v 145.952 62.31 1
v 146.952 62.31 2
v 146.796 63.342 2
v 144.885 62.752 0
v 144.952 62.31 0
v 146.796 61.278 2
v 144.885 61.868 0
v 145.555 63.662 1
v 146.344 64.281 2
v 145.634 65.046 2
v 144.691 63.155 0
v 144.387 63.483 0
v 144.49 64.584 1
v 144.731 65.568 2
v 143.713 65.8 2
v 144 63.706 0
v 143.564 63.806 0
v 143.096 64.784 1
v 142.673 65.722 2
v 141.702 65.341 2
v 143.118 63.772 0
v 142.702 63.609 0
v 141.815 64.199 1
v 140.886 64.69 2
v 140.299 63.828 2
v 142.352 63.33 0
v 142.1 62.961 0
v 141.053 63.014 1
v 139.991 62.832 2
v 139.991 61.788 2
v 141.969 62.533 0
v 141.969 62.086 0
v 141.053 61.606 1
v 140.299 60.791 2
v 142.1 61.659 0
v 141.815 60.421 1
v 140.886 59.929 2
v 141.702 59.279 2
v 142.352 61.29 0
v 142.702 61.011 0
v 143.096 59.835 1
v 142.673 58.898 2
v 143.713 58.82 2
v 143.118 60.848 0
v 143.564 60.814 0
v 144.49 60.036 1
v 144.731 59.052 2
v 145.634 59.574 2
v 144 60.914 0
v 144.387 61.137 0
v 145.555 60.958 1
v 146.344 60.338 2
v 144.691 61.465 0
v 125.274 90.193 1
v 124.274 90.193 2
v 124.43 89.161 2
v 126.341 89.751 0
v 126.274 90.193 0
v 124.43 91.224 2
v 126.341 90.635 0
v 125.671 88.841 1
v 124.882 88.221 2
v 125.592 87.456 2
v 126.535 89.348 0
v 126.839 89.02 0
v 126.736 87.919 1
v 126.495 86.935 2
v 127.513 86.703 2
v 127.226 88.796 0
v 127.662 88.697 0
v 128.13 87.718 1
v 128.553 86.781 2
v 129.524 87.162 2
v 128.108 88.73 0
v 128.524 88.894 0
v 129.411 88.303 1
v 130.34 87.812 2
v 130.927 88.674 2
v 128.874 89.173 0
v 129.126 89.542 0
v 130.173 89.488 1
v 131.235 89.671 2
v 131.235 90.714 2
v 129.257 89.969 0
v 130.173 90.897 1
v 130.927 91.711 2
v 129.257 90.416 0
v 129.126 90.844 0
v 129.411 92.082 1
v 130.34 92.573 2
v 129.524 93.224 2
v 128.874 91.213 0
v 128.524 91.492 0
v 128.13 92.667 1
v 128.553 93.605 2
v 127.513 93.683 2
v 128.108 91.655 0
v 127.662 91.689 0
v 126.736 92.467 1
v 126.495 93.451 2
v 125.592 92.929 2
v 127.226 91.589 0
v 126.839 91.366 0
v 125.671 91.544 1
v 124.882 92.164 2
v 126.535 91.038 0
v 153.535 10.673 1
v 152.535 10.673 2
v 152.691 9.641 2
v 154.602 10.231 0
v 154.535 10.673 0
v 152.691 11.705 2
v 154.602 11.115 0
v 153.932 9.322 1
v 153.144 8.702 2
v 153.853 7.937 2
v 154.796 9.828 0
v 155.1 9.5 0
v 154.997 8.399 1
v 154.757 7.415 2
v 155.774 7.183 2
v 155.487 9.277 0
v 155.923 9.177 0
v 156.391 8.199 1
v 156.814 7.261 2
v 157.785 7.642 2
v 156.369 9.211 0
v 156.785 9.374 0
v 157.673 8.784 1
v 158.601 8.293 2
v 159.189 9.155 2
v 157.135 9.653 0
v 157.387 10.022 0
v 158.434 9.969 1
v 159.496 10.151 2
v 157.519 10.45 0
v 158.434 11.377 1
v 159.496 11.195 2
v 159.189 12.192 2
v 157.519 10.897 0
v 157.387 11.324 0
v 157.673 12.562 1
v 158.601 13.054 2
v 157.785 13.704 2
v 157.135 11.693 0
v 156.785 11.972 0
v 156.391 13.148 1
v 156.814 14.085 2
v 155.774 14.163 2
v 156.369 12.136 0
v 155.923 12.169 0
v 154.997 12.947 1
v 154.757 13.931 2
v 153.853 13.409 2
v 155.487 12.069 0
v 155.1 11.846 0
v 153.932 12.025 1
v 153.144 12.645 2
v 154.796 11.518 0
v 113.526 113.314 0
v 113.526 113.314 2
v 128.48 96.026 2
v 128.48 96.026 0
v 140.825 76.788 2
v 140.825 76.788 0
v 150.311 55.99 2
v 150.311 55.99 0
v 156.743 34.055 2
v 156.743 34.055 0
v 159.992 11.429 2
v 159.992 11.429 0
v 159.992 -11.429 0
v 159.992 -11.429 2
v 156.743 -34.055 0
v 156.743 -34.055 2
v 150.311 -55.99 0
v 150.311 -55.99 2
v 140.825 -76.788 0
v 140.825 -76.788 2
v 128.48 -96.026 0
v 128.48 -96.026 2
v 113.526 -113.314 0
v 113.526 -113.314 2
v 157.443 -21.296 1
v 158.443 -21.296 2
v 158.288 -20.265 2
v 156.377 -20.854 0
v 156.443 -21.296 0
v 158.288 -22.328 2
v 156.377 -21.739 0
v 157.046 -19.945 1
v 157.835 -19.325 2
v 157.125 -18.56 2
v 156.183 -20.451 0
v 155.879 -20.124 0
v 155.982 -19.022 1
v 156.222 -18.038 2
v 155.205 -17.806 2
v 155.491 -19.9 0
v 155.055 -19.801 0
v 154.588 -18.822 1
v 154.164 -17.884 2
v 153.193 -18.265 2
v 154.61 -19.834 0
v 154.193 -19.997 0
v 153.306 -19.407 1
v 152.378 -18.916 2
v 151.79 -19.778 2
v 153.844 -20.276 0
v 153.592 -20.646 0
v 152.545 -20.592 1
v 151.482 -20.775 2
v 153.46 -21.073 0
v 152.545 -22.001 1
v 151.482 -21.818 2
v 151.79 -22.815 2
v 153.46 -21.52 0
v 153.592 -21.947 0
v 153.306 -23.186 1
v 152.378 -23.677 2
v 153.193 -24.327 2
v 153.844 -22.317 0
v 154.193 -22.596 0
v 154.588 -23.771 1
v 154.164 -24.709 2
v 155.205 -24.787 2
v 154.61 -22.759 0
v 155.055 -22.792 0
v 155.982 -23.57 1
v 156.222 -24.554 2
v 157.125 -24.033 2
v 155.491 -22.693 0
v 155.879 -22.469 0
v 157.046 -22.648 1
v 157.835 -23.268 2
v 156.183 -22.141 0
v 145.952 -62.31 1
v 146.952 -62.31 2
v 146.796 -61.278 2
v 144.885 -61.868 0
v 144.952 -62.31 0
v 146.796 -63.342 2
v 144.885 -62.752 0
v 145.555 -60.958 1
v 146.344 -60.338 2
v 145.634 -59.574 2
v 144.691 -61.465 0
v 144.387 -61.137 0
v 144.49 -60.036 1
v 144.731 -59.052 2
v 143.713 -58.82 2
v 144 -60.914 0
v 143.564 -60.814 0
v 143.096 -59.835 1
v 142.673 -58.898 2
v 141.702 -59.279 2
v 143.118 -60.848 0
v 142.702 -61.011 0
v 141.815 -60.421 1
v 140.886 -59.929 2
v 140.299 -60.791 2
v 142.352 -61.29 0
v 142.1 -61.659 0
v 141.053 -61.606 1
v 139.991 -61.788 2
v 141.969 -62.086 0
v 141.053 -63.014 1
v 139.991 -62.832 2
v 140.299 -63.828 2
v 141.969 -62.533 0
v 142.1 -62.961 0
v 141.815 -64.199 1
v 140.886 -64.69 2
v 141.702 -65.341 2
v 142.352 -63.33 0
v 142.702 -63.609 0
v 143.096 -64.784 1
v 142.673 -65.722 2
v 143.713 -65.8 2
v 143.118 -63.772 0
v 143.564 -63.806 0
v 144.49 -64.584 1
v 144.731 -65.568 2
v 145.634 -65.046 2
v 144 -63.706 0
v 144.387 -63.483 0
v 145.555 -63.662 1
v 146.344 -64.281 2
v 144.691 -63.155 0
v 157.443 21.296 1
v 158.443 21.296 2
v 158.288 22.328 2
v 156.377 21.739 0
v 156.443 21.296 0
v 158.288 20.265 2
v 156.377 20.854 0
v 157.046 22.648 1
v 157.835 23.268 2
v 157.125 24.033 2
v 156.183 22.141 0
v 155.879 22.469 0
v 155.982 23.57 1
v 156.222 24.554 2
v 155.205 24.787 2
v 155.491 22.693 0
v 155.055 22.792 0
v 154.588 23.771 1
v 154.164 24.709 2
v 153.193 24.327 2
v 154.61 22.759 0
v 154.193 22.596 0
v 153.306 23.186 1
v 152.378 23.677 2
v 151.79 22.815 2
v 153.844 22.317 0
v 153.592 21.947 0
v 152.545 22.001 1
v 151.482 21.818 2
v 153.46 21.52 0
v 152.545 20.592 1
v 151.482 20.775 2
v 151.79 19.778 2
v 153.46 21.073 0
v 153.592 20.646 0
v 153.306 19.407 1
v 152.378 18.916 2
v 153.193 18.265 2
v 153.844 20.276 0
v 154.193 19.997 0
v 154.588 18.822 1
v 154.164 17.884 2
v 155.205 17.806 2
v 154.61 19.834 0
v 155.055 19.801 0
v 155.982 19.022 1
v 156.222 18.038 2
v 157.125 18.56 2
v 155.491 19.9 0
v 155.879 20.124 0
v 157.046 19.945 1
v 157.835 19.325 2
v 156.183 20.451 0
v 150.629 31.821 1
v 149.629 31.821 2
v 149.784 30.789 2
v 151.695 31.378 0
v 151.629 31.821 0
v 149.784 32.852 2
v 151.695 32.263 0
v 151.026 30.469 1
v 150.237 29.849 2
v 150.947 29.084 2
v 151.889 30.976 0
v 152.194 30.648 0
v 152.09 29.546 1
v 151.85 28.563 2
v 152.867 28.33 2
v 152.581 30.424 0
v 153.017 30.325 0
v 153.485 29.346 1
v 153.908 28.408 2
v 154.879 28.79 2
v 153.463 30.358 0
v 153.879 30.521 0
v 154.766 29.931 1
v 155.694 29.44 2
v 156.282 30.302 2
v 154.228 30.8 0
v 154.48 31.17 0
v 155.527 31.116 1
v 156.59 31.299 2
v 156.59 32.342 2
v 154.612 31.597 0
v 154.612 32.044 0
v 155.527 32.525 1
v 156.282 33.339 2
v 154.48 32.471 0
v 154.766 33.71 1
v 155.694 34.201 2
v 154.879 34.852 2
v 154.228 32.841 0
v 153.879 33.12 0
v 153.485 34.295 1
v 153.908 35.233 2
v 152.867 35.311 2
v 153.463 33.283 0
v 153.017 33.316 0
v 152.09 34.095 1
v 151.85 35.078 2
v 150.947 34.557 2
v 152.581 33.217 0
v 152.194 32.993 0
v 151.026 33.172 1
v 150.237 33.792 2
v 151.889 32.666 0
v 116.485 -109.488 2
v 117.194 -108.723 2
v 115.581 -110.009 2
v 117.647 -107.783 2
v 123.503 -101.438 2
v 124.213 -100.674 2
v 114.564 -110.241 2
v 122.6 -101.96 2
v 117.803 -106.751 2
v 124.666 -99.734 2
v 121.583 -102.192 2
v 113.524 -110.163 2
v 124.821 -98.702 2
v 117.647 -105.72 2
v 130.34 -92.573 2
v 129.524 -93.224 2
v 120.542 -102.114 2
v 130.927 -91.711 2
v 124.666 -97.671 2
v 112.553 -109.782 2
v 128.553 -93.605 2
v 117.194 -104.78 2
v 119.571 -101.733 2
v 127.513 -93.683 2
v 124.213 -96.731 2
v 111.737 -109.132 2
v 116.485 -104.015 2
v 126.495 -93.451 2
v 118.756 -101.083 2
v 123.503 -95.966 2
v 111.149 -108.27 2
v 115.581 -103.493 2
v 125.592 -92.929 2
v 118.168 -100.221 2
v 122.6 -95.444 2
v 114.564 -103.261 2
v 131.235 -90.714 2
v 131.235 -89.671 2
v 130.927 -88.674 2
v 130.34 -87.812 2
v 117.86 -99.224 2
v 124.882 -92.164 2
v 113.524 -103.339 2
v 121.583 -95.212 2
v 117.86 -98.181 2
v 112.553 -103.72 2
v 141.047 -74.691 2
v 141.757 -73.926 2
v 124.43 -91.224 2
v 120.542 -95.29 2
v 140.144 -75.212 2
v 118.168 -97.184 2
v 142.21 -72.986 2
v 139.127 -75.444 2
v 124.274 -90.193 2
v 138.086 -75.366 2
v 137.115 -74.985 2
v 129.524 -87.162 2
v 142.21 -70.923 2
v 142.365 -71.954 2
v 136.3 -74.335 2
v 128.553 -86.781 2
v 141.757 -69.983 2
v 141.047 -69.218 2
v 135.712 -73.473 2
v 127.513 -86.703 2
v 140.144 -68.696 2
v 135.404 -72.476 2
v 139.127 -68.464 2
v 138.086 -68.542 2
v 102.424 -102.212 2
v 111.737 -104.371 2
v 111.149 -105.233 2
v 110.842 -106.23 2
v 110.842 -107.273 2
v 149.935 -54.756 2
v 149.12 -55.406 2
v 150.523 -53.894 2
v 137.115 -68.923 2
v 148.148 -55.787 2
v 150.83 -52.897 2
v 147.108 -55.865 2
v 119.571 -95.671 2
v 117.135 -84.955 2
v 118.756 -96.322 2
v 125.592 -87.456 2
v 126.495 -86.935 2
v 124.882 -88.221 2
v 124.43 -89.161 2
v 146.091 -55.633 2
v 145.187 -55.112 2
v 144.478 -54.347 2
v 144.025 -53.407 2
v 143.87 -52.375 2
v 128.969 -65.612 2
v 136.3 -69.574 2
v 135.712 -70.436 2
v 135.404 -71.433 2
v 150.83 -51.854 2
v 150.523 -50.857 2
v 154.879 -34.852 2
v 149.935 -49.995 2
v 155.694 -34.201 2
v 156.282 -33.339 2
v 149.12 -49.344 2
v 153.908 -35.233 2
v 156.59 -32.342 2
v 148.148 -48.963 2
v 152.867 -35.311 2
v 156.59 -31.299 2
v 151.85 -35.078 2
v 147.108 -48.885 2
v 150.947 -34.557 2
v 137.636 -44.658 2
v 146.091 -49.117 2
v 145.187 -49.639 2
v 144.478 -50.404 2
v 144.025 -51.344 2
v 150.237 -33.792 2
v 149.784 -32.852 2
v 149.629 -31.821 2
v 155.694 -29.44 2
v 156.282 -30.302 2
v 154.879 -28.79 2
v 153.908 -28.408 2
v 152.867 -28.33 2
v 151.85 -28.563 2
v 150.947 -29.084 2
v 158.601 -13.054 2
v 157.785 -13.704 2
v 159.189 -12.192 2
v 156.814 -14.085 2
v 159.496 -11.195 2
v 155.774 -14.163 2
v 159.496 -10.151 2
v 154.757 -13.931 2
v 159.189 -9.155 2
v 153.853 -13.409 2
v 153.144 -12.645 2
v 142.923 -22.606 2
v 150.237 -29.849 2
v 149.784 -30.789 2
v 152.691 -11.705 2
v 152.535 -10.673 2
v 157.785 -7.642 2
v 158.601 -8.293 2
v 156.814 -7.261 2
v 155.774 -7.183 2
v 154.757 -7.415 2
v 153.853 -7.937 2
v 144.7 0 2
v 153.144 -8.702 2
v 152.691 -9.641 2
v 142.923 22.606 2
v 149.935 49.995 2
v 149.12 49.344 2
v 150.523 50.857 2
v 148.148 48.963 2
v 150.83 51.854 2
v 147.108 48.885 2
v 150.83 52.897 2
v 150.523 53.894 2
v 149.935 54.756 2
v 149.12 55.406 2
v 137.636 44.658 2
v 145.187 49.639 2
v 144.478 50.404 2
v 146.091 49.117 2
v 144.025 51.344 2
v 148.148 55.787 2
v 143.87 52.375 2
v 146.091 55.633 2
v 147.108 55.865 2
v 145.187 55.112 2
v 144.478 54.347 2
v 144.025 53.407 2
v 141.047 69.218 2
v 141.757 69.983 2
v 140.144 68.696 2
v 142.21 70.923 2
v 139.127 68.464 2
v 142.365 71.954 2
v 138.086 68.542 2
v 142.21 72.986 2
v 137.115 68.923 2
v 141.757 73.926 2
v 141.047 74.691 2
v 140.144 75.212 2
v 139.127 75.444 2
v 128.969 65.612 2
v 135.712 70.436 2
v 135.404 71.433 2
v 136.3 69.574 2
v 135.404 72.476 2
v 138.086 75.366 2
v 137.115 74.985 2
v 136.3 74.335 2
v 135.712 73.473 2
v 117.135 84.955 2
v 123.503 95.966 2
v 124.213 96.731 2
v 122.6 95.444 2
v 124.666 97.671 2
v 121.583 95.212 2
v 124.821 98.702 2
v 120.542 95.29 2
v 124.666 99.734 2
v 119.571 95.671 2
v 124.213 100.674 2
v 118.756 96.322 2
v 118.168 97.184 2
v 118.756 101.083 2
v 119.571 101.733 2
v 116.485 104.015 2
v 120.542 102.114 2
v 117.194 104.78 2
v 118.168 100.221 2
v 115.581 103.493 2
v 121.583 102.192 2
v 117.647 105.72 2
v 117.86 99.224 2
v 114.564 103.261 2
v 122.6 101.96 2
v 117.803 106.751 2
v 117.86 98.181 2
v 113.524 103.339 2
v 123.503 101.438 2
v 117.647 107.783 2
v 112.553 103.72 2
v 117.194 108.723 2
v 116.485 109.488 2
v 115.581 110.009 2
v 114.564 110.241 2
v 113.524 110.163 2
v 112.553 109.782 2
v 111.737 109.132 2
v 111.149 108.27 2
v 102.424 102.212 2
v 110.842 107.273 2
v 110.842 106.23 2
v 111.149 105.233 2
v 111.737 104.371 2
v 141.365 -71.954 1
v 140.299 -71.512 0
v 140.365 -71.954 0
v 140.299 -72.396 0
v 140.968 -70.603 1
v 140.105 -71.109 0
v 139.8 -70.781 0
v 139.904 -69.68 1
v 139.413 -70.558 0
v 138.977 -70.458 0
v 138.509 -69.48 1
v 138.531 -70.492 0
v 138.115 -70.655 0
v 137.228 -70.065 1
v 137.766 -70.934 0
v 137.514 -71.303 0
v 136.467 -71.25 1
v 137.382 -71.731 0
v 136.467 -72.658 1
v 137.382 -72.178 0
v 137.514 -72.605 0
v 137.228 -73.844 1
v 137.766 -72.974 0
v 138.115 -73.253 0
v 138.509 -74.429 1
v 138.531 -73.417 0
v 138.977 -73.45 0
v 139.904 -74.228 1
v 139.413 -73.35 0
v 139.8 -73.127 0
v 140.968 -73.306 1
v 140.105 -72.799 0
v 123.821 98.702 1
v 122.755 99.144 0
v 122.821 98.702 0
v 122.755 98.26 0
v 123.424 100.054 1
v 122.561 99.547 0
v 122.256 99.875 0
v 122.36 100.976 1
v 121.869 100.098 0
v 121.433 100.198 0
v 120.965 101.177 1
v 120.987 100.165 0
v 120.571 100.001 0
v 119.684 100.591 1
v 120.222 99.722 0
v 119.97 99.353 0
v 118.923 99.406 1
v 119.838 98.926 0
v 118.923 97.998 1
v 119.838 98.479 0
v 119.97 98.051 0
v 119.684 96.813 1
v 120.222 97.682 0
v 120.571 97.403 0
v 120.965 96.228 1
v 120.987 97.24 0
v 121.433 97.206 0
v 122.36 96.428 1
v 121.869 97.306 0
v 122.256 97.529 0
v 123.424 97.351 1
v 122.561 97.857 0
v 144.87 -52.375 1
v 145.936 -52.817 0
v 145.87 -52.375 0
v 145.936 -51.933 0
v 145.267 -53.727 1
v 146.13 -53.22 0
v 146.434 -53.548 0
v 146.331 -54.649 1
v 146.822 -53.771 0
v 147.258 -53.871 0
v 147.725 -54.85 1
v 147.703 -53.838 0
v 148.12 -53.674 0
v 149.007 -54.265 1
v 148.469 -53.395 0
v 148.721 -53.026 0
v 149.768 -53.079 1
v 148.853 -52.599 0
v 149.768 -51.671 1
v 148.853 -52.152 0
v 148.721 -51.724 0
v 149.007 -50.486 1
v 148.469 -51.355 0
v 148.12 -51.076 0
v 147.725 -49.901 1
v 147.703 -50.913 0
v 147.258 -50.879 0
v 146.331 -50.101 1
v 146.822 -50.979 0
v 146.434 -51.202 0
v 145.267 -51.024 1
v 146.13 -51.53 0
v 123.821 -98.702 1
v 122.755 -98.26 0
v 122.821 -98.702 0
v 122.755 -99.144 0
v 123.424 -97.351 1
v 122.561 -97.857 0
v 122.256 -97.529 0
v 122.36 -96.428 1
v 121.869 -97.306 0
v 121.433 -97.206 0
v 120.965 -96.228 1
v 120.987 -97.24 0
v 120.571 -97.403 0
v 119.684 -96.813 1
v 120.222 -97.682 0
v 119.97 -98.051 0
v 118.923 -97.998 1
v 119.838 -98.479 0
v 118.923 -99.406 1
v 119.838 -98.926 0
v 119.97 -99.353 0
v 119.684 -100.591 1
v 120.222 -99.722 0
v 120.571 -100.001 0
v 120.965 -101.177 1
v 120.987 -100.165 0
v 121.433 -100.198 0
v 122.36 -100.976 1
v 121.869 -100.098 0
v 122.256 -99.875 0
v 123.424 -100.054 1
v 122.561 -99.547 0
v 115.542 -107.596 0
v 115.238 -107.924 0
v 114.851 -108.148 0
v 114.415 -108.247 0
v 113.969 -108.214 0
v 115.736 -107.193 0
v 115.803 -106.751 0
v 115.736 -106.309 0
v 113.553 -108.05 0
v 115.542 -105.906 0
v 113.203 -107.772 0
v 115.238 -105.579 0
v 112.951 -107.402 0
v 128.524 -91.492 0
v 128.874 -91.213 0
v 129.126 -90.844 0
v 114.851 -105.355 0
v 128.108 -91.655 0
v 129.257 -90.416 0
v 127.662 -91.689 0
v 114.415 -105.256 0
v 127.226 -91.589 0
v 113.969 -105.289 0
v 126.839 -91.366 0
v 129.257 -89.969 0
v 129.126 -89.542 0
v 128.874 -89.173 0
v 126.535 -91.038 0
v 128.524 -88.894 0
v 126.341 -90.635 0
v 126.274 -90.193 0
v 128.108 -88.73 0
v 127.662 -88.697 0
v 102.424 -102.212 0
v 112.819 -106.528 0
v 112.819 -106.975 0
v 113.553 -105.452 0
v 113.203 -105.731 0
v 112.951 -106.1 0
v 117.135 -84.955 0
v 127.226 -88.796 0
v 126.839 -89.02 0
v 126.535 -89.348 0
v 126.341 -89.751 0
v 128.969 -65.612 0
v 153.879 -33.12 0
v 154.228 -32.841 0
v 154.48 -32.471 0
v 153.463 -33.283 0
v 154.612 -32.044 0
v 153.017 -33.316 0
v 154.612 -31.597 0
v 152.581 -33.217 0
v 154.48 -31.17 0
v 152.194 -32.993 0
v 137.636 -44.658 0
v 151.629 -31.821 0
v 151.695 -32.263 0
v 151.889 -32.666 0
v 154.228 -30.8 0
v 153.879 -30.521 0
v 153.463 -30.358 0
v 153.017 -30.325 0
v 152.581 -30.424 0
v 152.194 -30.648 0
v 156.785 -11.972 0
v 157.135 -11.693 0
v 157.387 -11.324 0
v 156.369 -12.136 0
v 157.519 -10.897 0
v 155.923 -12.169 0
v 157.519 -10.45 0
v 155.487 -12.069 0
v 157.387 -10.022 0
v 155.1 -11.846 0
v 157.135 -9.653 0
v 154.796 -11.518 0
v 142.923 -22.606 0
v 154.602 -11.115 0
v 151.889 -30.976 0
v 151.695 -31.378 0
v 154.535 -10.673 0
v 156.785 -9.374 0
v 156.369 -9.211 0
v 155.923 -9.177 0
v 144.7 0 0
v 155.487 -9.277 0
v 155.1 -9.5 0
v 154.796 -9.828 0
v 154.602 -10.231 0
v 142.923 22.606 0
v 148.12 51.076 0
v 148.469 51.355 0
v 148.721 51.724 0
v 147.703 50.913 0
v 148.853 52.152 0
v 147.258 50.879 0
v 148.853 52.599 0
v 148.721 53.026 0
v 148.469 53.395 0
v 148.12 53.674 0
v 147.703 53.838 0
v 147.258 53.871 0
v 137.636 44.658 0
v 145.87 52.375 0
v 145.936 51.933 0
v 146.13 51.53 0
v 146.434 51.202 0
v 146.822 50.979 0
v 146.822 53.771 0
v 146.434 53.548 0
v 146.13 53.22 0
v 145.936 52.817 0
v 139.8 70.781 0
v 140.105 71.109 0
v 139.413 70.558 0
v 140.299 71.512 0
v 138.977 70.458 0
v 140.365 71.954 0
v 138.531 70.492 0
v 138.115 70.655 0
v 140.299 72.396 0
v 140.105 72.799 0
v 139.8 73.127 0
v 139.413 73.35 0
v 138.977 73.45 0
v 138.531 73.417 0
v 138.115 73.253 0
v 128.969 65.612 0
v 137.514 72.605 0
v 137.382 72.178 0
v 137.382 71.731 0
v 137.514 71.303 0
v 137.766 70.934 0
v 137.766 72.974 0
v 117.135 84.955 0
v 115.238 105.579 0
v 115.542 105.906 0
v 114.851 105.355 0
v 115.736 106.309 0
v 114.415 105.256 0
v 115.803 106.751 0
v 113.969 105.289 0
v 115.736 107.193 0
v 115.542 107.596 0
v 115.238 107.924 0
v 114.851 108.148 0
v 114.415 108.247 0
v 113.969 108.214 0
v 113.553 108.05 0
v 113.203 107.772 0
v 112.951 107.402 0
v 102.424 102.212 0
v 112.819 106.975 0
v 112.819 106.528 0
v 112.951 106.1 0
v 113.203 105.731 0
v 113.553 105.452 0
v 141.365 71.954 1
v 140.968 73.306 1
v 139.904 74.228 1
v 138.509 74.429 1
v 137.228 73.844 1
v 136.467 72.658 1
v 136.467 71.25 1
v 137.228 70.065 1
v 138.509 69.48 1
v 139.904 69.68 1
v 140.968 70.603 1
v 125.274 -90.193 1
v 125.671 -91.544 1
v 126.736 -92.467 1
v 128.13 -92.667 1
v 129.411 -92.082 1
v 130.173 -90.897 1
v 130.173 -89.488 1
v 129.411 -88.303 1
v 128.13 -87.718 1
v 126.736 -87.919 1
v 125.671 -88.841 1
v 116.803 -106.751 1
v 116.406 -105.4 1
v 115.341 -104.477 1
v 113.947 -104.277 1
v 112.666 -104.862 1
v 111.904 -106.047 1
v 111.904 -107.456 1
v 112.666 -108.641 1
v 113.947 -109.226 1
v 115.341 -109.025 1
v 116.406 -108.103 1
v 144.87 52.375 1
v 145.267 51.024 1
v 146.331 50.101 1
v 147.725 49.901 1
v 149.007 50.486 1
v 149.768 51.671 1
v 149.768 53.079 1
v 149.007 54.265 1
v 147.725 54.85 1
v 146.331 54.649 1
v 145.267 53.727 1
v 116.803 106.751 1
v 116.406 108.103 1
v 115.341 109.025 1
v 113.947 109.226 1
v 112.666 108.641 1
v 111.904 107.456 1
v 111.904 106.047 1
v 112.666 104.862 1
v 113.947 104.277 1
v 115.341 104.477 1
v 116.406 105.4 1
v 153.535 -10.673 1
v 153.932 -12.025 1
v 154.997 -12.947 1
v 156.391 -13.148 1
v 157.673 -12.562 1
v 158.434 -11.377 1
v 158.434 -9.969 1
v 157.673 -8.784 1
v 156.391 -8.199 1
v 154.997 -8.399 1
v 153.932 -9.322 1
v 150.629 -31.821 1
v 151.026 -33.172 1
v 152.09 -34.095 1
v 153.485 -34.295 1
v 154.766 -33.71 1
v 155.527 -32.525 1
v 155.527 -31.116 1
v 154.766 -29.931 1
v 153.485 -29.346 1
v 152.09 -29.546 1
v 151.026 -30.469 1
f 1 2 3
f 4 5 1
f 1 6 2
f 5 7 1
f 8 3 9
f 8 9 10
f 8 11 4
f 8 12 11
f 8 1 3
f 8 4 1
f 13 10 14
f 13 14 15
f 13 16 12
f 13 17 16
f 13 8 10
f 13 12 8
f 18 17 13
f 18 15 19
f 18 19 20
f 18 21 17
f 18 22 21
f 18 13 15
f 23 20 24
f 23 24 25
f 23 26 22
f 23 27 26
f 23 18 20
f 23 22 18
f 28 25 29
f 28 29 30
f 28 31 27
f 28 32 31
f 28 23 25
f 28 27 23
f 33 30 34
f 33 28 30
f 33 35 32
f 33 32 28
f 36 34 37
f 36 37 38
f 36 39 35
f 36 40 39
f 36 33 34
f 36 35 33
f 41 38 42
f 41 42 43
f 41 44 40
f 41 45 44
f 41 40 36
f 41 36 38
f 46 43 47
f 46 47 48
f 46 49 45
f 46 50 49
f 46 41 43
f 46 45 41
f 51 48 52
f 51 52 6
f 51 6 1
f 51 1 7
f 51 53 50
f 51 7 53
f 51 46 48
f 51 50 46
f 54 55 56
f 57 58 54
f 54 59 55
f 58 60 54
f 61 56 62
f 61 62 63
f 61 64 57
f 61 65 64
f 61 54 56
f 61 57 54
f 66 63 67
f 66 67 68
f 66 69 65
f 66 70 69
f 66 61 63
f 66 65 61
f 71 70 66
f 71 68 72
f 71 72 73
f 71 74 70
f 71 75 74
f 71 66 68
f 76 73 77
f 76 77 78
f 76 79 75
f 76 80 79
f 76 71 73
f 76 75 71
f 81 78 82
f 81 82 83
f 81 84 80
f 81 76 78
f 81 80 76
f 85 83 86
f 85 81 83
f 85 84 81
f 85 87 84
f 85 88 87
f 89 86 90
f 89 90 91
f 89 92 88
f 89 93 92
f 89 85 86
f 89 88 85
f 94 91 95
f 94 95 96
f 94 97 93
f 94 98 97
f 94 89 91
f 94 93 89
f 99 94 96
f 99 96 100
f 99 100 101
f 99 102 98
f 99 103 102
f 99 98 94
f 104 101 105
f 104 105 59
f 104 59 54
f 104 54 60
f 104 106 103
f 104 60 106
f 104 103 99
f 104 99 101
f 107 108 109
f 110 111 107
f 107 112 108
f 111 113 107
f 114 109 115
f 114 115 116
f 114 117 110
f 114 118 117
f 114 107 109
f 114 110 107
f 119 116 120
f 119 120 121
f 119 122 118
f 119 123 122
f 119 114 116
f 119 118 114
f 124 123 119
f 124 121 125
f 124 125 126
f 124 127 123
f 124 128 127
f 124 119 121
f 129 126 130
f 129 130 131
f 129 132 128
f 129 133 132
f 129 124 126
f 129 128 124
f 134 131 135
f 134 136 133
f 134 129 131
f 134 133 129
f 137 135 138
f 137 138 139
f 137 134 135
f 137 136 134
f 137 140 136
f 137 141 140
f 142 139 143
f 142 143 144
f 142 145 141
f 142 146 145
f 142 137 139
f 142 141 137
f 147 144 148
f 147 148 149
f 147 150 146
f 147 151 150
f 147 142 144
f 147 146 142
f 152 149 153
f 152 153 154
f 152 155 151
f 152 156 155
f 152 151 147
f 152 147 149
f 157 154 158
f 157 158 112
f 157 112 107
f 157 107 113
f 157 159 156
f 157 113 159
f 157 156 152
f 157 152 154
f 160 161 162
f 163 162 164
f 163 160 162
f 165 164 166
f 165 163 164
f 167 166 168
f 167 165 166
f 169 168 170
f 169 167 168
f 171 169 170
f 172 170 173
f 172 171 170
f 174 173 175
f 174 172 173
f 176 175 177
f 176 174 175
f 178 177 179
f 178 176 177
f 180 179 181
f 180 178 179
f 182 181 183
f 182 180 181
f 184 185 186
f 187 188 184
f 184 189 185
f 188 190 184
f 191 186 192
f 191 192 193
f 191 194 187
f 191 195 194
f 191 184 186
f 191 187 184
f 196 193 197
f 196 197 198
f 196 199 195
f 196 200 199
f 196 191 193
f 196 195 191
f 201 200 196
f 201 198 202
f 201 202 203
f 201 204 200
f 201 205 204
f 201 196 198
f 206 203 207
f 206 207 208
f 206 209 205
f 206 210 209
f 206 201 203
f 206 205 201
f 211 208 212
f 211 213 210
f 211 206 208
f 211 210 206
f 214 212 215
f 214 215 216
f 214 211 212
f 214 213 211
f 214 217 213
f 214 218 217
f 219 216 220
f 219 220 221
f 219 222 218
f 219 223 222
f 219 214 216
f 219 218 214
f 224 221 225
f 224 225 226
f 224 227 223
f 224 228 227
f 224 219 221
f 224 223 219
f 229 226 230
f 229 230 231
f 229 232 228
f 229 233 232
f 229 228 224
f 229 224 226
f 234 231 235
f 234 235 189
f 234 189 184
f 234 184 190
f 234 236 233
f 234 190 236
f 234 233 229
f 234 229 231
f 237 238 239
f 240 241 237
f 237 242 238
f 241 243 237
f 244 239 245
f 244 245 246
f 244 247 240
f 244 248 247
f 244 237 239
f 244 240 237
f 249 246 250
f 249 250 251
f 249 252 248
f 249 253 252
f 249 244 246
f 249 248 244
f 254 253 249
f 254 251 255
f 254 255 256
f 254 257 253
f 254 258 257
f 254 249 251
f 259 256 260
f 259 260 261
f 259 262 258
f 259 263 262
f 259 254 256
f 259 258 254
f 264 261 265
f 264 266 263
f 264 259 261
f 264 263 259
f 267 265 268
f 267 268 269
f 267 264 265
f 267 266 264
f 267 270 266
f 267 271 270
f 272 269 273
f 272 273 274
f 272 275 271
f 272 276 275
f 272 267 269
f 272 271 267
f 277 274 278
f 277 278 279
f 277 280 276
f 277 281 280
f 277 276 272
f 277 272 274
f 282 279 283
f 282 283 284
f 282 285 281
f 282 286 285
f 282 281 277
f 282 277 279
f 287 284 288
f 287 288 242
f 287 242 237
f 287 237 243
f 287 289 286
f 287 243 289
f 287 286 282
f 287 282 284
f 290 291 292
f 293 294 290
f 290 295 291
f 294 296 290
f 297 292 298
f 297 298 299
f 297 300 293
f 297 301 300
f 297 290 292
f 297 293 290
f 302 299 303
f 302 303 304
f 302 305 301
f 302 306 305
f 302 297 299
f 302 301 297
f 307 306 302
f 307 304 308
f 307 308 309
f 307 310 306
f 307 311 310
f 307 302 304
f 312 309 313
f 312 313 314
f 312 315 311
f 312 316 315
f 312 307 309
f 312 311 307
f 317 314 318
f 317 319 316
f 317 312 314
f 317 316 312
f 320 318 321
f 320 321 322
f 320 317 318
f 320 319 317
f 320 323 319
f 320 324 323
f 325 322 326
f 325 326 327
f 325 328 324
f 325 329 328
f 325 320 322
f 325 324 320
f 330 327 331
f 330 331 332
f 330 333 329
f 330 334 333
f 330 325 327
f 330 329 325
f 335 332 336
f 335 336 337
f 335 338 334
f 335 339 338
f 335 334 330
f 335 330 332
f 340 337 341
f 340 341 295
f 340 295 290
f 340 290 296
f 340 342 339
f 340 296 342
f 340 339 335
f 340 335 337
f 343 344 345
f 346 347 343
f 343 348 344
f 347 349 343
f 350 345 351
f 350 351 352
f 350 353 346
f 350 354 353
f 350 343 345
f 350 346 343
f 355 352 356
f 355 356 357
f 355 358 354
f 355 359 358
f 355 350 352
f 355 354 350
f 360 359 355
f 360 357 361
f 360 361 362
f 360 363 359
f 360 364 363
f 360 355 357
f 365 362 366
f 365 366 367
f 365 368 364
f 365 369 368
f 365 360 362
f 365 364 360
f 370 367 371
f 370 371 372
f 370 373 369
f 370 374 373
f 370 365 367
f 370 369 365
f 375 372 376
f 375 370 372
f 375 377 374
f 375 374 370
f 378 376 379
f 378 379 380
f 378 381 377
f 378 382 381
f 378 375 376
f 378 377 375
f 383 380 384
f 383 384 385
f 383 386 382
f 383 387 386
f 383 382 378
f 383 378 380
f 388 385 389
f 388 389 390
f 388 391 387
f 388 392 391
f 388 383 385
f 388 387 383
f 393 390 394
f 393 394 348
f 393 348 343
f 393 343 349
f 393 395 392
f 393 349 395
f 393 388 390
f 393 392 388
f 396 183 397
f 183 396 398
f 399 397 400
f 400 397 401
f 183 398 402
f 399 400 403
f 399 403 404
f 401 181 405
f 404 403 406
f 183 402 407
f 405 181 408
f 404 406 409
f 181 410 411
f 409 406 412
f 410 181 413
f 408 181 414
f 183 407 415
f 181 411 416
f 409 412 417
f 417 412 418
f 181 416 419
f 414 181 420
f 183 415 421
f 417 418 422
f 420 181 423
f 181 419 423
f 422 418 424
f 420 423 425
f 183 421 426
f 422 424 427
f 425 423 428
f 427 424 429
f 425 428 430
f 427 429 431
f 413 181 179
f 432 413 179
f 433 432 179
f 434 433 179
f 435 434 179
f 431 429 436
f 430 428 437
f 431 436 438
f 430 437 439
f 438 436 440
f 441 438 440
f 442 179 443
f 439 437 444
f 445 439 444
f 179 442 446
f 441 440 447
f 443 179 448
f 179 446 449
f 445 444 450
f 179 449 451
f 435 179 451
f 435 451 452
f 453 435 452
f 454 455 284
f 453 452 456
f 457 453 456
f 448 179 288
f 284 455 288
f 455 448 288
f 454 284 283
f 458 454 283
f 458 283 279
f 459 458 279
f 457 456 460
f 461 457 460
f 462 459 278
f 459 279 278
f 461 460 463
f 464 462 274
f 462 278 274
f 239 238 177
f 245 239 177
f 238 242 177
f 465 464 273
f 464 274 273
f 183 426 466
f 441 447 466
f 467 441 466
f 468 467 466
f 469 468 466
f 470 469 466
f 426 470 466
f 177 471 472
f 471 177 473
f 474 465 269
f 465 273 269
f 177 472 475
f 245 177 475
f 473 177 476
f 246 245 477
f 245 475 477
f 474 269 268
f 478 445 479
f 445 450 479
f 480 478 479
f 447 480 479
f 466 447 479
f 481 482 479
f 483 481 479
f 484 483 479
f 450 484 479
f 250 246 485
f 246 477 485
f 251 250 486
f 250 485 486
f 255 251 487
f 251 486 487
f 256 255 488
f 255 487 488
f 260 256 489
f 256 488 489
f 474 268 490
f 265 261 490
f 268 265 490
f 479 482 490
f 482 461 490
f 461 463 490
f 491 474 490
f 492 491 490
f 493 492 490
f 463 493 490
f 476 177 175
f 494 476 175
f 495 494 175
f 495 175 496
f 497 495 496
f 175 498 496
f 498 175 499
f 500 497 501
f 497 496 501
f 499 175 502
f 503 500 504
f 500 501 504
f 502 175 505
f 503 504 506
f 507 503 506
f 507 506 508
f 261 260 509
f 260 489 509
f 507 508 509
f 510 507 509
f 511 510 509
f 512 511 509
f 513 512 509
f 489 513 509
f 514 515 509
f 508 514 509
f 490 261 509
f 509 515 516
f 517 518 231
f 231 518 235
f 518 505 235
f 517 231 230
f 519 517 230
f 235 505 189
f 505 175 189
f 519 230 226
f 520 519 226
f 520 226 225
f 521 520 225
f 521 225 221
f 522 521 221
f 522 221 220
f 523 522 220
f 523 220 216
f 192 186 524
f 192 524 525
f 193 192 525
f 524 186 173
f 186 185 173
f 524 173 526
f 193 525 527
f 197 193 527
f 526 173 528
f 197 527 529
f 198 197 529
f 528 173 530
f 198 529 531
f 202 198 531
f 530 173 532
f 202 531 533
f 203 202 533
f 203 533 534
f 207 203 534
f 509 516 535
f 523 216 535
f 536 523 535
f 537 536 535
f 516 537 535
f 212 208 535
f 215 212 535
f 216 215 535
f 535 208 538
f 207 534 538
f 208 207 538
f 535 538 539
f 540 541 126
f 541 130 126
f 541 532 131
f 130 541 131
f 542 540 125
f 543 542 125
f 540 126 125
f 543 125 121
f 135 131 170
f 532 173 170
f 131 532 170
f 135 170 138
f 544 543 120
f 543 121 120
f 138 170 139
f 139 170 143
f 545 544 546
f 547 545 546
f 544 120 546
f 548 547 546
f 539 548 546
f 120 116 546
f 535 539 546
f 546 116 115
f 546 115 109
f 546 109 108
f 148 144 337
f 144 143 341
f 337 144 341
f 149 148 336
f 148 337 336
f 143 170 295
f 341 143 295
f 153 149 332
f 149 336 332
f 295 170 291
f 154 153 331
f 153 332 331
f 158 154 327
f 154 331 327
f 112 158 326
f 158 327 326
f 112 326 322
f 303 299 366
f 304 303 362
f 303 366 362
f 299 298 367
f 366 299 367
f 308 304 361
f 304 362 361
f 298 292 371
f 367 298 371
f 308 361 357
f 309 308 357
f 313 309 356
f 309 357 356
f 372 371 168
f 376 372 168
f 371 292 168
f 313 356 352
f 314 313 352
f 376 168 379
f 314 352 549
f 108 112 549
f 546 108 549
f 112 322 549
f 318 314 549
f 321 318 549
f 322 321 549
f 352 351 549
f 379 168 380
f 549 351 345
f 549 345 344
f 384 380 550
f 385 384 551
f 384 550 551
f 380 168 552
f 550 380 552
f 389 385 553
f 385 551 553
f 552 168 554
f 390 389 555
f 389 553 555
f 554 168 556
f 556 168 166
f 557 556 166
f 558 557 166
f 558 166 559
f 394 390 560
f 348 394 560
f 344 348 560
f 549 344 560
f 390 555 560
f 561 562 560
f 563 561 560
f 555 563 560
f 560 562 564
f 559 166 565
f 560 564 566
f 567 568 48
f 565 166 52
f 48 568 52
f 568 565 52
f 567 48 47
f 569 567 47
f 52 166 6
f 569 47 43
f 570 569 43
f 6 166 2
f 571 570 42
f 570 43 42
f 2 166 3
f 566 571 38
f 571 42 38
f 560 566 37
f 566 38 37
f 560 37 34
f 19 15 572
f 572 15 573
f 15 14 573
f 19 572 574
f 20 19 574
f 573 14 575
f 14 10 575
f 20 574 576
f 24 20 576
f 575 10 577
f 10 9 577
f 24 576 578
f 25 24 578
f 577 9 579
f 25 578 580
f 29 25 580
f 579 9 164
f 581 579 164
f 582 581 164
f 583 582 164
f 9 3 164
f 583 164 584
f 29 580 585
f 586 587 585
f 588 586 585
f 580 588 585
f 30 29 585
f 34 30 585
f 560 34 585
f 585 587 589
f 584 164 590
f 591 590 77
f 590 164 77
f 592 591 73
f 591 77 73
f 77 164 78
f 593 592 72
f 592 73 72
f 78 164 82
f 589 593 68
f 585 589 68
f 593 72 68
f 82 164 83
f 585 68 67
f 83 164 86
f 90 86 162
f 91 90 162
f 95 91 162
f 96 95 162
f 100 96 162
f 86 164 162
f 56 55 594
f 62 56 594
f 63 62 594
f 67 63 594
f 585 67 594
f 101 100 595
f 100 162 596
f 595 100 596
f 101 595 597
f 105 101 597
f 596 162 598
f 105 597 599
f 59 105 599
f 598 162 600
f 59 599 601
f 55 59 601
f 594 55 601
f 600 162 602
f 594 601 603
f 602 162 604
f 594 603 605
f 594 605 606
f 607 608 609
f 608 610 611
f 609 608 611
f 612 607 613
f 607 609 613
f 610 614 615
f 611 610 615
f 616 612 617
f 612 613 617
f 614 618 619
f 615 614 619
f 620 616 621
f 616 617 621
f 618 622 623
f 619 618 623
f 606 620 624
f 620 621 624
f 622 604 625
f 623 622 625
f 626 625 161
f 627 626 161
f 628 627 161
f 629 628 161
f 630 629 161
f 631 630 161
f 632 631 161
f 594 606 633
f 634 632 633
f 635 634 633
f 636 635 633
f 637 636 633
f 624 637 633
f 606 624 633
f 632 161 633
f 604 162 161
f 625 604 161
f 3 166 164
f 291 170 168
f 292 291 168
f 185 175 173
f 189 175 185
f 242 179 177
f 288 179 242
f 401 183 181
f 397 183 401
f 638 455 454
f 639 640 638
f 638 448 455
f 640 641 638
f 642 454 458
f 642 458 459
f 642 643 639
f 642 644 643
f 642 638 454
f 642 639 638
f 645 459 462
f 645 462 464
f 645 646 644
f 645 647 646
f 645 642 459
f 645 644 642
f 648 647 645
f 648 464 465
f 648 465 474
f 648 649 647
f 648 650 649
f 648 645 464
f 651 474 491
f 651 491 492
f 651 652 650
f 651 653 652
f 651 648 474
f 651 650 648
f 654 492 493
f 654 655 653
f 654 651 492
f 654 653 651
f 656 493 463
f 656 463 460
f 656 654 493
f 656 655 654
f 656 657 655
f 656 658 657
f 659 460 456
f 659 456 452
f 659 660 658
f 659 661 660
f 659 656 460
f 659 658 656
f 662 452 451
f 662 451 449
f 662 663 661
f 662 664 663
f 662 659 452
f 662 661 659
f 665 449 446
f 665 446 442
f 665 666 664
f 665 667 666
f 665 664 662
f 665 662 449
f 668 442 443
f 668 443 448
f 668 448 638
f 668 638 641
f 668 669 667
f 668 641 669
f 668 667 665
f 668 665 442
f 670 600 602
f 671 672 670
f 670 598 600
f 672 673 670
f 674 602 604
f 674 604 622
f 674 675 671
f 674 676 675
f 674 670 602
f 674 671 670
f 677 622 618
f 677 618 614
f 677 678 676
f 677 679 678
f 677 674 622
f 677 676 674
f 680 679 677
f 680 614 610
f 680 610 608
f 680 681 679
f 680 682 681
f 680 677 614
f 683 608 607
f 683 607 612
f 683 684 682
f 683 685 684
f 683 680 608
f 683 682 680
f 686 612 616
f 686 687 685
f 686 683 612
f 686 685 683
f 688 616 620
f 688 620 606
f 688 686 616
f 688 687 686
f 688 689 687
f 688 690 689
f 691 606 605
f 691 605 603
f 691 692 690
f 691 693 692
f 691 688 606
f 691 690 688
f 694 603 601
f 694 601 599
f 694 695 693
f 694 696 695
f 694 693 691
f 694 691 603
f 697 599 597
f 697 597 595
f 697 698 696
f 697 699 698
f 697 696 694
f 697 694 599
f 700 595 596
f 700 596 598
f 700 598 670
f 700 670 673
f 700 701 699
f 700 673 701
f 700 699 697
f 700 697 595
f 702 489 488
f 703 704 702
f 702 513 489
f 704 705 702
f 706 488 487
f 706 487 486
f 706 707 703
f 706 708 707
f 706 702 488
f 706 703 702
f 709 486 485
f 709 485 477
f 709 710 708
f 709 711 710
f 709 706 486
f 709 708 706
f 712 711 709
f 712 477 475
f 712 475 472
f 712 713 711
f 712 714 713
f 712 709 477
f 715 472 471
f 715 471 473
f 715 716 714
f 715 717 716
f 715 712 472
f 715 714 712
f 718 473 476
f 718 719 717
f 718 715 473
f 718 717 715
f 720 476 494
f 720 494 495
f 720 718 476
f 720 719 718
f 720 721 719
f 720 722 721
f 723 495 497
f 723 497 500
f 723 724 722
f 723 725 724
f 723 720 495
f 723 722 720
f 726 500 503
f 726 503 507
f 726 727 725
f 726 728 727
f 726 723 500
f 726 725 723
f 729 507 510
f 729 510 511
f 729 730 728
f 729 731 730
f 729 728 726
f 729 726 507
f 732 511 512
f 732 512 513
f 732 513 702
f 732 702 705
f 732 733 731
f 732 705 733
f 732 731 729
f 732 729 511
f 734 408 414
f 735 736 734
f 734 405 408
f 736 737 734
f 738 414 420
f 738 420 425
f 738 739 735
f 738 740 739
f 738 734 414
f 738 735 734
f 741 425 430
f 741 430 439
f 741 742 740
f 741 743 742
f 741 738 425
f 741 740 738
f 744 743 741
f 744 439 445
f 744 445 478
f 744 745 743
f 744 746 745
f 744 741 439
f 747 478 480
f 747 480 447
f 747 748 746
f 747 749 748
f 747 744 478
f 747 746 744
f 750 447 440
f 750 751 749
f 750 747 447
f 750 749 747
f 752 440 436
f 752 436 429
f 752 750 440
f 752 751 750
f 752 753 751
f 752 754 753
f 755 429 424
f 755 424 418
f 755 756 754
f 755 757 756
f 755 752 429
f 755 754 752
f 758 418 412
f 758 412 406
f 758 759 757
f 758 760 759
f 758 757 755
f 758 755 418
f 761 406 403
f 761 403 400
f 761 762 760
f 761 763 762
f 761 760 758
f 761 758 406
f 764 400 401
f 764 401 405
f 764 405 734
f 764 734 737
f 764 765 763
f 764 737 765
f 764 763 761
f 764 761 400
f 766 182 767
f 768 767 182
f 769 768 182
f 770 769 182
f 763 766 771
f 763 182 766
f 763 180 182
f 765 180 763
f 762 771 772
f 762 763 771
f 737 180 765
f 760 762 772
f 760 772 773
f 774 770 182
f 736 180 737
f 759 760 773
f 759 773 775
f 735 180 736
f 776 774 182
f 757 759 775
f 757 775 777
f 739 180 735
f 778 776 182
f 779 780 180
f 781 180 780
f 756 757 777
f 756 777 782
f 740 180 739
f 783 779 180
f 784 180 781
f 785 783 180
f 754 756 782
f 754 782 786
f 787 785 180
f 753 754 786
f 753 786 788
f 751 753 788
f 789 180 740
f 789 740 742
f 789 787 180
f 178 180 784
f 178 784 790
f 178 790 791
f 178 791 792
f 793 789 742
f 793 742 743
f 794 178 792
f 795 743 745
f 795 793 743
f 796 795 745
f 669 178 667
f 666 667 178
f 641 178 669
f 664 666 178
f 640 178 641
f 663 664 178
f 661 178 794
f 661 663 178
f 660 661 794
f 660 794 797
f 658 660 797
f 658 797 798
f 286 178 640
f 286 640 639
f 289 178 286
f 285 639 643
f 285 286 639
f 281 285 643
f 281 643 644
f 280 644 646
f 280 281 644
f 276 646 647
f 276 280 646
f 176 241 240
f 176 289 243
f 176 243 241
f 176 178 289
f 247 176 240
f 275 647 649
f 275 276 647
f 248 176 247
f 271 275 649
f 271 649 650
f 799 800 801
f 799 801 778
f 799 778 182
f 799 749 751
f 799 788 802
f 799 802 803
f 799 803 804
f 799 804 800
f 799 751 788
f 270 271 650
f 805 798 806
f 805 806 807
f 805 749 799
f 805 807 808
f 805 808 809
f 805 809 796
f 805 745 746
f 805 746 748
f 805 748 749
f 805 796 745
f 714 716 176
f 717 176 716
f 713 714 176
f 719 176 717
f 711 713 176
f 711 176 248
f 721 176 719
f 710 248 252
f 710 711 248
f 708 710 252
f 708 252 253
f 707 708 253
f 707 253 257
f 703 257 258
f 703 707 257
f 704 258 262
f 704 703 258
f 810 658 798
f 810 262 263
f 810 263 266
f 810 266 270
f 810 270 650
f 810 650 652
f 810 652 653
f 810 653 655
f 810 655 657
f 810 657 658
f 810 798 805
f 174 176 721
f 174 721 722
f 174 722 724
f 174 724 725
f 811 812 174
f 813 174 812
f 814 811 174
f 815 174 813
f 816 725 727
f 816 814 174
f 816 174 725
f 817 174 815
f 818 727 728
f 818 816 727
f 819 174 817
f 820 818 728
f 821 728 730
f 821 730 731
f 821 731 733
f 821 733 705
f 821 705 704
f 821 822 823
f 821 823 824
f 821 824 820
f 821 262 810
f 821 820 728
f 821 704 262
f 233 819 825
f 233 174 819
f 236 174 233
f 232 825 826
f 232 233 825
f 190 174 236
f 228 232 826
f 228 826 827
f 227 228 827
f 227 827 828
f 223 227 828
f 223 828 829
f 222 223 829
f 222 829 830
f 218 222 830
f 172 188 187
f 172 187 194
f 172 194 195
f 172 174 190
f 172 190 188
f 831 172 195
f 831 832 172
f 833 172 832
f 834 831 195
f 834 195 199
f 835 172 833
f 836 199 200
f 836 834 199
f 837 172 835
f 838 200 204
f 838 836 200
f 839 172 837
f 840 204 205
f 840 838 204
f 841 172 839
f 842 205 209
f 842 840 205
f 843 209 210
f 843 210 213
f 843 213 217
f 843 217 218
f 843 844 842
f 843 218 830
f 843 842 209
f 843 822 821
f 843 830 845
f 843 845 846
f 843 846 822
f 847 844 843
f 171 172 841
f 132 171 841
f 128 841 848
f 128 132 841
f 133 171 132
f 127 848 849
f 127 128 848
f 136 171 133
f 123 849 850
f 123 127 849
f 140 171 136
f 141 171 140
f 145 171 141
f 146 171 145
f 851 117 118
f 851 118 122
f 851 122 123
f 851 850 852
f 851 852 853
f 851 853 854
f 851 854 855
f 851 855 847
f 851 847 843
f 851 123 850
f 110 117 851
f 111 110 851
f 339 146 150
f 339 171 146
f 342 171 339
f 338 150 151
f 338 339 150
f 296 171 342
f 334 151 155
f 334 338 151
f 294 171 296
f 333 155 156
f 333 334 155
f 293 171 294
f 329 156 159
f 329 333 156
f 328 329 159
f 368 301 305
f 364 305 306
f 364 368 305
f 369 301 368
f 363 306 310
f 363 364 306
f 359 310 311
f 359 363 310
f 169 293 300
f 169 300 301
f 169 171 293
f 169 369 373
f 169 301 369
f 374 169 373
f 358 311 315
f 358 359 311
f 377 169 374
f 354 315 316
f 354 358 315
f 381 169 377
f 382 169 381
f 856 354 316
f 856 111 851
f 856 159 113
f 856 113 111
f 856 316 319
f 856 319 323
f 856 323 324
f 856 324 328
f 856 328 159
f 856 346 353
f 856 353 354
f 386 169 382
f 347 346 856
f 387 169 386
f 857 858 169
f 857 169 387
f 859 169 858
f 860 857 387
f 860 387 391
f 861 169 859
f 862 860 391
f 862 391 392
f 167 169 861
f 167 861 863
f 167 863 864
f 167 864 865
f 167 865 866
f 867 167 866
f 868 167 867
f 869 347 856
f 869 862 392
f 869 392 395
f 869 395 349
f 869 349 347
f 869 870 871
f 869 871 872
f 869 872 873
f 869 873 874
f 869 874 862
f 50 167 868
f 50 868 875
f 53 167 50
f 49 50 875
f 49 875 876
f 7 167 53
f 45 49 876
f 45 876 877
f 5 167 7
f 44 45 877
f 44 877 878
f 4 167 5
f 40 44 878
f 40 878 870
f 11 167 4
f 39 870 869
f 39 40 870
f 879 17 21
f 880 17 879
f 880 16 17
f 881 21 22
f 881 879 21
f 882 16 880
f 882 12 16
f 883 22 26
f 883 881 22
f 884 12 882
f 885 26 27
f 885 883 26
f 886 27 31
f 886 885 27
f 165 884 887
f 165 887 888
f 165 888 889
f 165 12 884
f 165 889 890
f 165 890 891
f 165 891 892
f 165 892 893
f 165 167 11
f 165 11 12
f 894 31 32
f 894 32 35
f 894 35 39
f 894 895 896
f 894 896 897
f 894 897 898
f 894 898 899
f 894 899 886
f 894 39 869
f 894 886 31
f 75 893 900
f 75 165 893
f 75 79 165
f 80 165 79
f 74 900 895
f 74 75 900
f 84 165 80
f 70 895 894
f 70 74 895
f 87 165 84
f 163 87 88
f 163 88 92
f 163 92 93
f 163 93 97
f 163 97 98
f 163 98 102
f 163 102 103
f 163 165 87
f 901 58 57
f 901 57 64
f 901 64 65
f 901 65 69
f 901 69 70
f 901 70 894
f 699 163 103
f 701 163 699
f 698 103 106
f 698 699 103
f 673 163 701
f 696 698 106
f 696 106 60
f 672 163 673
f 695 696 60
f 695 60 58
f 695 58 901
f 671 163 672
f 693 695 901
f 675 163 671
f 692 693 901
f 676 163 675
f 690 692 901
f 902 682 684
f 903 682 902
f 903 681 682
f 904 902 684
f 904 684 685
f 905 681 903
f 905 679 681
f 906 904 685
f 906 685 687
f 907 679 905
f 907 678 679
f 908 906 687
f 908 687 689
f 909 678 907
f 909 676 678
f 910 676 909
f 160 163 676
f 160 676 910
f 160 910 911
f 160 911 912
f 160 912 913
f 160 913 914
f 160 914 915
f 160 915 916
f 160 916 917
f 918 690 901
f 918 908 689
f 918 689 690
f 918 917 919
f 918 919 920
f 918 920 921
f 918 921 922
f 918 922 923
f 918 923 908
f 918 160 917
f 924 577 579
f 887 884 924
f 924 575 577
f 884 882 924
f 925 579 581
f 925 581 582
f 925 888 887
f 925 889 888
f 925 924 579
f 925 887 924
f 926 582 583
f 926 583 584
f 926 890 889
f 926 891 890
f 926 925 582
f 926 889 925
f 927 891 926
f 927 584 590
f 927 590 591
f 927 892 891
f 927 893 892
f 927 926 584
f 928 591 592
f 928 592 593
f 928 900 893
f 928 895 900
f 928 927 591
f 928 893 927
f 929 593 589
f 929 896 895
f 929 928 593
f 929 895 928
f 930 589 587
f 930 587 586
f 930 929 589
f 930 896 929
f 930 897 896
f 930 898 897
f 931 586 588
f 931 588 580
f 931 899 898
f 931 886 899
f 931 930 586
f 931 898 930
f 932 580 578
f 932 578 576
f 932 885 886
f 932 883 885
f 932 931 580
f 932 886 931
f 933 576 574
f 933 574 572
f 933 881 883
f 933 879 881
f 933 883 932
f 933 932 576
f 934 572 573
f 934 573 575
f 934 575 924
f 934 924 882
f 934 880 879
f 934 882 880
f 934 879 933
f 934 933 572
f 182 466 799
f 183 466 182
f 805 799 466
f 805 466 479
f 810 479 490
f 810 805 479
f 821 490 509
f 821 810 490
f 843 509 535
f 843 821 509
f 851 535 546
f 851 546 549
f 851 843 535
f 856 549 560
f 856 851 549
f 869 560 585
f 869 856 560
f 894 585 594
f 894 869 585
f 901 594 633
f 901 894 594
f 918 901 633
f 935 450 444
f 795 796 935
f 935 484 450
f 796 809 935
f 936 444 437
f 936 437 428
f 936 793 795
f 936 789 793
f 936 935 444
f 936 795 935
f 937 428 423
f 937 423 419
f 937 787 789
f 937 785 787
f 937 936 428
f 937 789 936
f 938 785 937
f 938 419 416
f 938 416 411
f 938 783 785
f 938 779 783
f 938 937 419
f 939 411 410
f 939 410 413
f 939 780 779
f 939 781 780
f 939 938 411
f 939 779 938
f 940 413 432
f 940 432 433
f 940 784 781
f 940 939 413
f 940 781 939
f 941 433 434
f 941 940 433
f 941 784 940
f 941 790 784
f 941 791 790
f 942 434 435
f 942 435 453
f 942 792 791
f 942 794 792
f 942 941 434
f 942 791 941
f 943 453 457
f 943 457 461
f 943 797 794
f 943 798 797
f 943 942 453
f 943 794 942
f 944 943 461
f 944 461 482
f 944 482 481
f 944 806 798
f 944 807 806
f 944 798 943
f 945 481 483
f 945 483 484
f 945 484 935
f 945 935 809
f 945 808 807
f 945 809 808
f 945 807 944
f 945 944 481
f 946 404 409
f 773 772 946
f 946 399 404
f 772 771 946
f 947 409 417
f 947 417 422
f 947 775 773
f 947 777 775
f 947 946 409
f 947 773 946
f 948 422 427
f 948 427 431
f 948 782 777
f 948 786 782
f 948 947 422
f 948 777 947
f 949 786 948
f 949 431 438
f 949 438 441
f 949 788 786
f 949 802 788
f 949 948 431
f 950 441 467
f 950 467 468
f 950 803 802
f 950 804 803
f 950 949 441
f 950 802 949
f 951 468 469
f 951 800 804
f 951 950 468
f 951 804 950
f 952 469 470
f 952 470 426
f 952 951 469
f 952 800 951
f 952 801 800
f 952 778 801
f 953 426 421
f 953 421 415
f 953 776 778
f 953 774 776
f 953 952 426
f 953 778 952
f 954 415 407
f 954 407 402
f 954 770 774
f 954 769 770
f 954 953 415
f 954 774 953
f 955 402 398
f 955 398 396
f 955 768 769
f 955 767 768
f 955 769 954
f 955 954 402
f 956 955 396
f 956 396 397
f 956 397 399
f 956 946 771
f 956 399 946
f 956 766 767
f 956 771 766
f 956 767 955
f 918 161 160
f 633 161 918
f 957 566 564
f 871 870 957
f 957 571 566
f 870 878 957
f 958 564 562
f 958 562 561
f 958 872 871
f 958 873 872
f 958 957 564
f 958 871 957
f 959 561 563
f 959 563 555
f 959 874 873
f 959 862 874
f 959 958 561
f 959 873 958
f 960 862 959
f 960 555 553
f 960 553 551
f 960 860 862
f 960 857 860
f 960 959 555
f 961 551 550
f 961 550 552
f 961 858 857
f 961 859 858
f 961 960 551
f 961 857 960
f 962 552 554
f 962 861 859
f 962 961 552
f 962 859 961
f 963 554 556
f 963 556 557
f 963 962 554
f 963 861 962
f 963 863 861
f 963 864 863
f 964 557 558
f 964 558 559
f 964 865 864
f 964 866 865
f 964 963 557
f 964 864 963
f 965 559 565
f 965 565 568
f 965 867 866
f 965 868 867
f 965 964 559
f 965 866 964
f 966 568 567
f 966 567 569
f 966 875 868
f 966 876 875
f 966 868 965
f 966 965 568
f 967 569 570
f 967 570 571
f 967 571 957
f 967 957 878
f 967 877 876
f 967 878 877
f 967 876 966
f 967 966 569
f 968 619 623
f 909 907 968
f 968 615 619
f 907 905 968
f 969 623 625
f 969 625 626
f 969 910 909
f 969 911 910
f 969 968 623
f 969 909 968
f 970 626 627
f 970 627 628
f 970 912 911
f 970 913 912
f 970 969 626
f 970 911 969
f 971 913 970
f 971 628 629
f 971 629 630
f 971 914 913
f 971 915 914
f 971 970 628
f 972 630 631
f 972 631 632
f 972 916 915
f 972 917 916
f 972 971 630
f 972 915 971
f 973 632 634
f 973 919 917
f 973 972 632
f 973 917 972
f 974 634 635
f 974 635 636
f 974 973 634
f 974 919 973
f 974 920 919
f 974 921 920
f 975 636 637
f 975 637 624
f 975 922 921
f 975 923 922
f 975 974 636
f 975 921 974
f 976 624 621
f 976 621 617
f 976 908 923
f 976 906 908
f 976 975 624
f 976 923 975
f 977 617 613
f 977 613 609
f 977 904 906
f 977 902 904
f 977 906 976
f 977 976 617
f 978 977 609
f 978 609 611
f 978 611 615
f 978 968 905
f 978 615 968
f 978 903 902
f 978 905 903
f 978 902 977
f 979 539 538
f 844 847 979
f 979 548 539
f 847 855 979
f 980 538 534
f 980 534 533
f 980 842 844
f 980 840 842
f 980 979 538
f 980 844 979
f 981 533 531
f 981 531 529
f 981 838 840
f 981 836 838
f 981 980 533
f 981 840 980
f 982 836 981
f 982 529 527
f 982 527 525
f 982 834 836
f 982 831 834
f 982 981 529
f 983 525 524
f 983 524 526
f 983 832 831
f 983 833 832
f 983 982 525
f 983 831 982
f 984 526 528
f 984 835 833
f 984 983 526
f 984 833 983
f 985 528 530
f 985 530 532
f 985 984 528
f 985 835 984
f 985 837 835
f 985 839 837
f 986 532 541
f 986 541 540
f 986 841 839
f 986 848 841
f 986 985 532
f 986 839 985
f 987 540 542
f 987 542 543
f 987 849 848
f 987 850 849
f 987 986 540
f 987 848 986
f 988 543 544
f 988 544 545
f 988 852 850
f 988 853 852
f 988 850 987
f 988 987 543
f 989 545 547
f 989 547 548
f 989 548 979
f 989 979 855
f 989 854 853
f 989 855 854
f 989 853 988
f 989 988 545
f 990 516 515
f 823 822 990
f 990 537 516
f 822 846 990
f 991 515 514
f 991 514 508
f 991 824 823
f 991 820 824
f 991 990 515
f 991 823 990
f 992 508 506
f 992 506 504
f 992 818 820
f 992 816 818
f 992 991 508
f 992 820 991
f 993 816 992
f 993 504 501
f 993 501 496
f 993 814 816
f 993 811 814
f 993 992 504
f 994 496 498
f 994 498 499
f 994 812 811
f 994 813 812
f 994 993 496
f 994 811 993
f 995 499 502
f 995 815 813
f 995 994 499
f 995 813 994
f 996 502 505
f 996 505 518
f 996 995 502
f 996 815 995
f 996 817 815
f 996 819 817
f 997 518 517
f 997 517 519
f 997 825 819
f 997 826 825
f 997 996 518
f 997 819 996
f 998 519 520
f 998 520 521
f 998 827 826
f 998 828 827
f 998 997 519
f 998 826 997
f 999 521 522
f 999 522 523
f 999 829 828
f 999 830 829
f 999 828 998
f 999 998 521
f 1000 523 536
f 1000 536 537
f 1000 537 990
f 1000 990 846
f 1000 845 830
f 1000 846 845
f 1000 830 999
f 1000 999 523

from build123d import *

# Parameters (mm, degrees)
SKETCH1_R           = 1.5
BOSS_EXTRUDE1_DEPTH = 2
CUT_EXTRUDE1_DEPTH  = 197.459257863
CHAMFER1_SIZE       = 2


with BuildPart() as part:
    # Sketch1 → Boss-Extrude1 (new body)
    with BuildSketch(Plane.XY):
        with BuildLine():
            Line((102.318351238, 102.318351238), (113.419927702, 113.419927702))
            ThreePointArc((113.419927702, 113.419927702), (160.4, 0), (113.419927702, -113.419927702))
            Line((113.419927702, -113.419927702), (102.318351238, -102.318351238))
            ThreePointArc((102.318351238, -102.318351238), (144.7, 0), (102.318351238, 102.318351238))
        make_face()
        with Locations((121.321245866, 98.702154493)):
            Circle(SKETCH1_R, mode=Mode.SUBTRACT)
        with Locations((143.451847555, 62.309930452)):
            Circle(SKETCH1_R, mode=Mode.SUBTRACT)
        with Locations((154.94328196, 21.296463919)):
            Circle(SKETCH1_R, mode=Mode.SUBTRACT)
        with Locations((154.94328196, -21.296463919)):
            Circle(SKETCH1_R, mode=Mode.SUBTRACT)
        with Locations((143.451847555, -62.309930452)):
            Circle(SKETCH1_R, mode=Mode.SUBTRACT)
        with Locations((121.321245866, -98.702154493)):
            Circle(SKETCH1_R, mode=Mode.SUBTRACT)
        with Locations(Location((127.774091267, 90.192802379, 0), (0, 0, 180))):
            Circle(SKETCH1_R, mode=Mode.SUBTRACT)
        with Locations(Location((147.369608219, 52.375171344, 0), (0, 0, 180))):
            Circle(SKETCH1_R, mode=Mode.SUBTRACT)
        with Locations(Location((153.128751314, 31.820520441, 0), (0, 0, 180))):
            Circle(SKETCH1_R, mode=Mode.SUBTRACT)
        with Locations(Location((156.035395501, 10.67311345, 0), (0, 0, 180))):
            Circle(SKETCH1_R, mode=Mode.SUBTRACT)
        with Locations(Location((127.774091267, -90.192802379, 0), (0, 0, 180))):
            Circle(SKETCH1_R, mode=Mode.SUBTRACT)
        with Locations(Location((147.369608219, -52.375171344, 0), (0, 0, 180))):
            Circle(SKETCH1_R, mode=Mode.SUBTRACT)
        with Locations(Location((153.128751314, -31.820520441, 0), (0, 0, 180))):
            Circle(SKETCH1_R, mode=Mode.SUBTRACT)
        with Locations(Location((156.035395501, -10.67311345, 0), (0, 0, 180))):
            Circle(SKETCH1_R, mode=Mode.SUBTRACT)
        with Locations((138.865248158, 71.954171901)):
            Circle(SKETCH1_R, mode=Mode.SUBTRACT)
        with Locations((114.302744813, 106.751311599)):
            Circle(SKETCH1_R, mode=Mode.SUBTRACT)
        with Locations((138.865248158, -71.954171901)):
            Circle(SKETCH1_R, mode=Mode.SUBTRACT)
        with Locations((114.302744813, -106.751311599)):
            Circle(SKETCH1_R, mode=Mode.SUBTRACT)
    extrude(amount=BOSS_EXTRUDE1_DEPTH)

    # Sketch2 → Cut-Extrude1 (cut, through all)
    with BuildSketch(Plane.XY.offset(2)):
        Polygon((117.10590357, 116.893771535), (92.696291985, 92.484159951), (81.614099529, 103.566352407), (106.023711114, 127.975963992), align=None)
        Polygon((94.953094668, -94.740962634), (127.588403443, -127.376271408), (106.110382849, -148.854292002), (73.475074075, -116.218983227), align=None)
    extrude(amount=-CUT_EXTRUDE1_DEPTH, mode=Mode.SUBTRACT)

    # Chamfer1
    chamfer1_edges = [part.edges().sort_by_distance(p)[0] for p in [
        (119.821245866, 98.702154493, 2),
        (141.951847555, 62.309930452, 2),
        (153.44328196, 21.296463919, 2),
        (153.44328196, -21.296463919, 2),
        (141.951847555, -62.309930452, 2),
        (119.821245866, -98.702154493, 2),
        (129.274091267, 90.192802379, 2),
        (148.869608219, 52.375171344, 2),
        (154.628751314, 31.820520441, 2),
        (157.535395501, 10.67311345, 2),
        (129.274091267, -90.192802379, 2),
        (148.869608219, -52.375171344, 2),
        (154.628751314, -31.820520441, 2),
        (157.535395501, -10.67311345, 2),
        (112.802744813, 106.751311599, 2),
        (137.365248158, 71.954171901, 2),
        (137.365248158, -71.954171901, 2),
        (112.802744813, -106.751311599, 2),
    ]]
    chamfer(chamfer1_edges, length=CHAMFER1_SIZE - 0.0001)  # a hair under: the kernel refuses the full size


solid = part.part
